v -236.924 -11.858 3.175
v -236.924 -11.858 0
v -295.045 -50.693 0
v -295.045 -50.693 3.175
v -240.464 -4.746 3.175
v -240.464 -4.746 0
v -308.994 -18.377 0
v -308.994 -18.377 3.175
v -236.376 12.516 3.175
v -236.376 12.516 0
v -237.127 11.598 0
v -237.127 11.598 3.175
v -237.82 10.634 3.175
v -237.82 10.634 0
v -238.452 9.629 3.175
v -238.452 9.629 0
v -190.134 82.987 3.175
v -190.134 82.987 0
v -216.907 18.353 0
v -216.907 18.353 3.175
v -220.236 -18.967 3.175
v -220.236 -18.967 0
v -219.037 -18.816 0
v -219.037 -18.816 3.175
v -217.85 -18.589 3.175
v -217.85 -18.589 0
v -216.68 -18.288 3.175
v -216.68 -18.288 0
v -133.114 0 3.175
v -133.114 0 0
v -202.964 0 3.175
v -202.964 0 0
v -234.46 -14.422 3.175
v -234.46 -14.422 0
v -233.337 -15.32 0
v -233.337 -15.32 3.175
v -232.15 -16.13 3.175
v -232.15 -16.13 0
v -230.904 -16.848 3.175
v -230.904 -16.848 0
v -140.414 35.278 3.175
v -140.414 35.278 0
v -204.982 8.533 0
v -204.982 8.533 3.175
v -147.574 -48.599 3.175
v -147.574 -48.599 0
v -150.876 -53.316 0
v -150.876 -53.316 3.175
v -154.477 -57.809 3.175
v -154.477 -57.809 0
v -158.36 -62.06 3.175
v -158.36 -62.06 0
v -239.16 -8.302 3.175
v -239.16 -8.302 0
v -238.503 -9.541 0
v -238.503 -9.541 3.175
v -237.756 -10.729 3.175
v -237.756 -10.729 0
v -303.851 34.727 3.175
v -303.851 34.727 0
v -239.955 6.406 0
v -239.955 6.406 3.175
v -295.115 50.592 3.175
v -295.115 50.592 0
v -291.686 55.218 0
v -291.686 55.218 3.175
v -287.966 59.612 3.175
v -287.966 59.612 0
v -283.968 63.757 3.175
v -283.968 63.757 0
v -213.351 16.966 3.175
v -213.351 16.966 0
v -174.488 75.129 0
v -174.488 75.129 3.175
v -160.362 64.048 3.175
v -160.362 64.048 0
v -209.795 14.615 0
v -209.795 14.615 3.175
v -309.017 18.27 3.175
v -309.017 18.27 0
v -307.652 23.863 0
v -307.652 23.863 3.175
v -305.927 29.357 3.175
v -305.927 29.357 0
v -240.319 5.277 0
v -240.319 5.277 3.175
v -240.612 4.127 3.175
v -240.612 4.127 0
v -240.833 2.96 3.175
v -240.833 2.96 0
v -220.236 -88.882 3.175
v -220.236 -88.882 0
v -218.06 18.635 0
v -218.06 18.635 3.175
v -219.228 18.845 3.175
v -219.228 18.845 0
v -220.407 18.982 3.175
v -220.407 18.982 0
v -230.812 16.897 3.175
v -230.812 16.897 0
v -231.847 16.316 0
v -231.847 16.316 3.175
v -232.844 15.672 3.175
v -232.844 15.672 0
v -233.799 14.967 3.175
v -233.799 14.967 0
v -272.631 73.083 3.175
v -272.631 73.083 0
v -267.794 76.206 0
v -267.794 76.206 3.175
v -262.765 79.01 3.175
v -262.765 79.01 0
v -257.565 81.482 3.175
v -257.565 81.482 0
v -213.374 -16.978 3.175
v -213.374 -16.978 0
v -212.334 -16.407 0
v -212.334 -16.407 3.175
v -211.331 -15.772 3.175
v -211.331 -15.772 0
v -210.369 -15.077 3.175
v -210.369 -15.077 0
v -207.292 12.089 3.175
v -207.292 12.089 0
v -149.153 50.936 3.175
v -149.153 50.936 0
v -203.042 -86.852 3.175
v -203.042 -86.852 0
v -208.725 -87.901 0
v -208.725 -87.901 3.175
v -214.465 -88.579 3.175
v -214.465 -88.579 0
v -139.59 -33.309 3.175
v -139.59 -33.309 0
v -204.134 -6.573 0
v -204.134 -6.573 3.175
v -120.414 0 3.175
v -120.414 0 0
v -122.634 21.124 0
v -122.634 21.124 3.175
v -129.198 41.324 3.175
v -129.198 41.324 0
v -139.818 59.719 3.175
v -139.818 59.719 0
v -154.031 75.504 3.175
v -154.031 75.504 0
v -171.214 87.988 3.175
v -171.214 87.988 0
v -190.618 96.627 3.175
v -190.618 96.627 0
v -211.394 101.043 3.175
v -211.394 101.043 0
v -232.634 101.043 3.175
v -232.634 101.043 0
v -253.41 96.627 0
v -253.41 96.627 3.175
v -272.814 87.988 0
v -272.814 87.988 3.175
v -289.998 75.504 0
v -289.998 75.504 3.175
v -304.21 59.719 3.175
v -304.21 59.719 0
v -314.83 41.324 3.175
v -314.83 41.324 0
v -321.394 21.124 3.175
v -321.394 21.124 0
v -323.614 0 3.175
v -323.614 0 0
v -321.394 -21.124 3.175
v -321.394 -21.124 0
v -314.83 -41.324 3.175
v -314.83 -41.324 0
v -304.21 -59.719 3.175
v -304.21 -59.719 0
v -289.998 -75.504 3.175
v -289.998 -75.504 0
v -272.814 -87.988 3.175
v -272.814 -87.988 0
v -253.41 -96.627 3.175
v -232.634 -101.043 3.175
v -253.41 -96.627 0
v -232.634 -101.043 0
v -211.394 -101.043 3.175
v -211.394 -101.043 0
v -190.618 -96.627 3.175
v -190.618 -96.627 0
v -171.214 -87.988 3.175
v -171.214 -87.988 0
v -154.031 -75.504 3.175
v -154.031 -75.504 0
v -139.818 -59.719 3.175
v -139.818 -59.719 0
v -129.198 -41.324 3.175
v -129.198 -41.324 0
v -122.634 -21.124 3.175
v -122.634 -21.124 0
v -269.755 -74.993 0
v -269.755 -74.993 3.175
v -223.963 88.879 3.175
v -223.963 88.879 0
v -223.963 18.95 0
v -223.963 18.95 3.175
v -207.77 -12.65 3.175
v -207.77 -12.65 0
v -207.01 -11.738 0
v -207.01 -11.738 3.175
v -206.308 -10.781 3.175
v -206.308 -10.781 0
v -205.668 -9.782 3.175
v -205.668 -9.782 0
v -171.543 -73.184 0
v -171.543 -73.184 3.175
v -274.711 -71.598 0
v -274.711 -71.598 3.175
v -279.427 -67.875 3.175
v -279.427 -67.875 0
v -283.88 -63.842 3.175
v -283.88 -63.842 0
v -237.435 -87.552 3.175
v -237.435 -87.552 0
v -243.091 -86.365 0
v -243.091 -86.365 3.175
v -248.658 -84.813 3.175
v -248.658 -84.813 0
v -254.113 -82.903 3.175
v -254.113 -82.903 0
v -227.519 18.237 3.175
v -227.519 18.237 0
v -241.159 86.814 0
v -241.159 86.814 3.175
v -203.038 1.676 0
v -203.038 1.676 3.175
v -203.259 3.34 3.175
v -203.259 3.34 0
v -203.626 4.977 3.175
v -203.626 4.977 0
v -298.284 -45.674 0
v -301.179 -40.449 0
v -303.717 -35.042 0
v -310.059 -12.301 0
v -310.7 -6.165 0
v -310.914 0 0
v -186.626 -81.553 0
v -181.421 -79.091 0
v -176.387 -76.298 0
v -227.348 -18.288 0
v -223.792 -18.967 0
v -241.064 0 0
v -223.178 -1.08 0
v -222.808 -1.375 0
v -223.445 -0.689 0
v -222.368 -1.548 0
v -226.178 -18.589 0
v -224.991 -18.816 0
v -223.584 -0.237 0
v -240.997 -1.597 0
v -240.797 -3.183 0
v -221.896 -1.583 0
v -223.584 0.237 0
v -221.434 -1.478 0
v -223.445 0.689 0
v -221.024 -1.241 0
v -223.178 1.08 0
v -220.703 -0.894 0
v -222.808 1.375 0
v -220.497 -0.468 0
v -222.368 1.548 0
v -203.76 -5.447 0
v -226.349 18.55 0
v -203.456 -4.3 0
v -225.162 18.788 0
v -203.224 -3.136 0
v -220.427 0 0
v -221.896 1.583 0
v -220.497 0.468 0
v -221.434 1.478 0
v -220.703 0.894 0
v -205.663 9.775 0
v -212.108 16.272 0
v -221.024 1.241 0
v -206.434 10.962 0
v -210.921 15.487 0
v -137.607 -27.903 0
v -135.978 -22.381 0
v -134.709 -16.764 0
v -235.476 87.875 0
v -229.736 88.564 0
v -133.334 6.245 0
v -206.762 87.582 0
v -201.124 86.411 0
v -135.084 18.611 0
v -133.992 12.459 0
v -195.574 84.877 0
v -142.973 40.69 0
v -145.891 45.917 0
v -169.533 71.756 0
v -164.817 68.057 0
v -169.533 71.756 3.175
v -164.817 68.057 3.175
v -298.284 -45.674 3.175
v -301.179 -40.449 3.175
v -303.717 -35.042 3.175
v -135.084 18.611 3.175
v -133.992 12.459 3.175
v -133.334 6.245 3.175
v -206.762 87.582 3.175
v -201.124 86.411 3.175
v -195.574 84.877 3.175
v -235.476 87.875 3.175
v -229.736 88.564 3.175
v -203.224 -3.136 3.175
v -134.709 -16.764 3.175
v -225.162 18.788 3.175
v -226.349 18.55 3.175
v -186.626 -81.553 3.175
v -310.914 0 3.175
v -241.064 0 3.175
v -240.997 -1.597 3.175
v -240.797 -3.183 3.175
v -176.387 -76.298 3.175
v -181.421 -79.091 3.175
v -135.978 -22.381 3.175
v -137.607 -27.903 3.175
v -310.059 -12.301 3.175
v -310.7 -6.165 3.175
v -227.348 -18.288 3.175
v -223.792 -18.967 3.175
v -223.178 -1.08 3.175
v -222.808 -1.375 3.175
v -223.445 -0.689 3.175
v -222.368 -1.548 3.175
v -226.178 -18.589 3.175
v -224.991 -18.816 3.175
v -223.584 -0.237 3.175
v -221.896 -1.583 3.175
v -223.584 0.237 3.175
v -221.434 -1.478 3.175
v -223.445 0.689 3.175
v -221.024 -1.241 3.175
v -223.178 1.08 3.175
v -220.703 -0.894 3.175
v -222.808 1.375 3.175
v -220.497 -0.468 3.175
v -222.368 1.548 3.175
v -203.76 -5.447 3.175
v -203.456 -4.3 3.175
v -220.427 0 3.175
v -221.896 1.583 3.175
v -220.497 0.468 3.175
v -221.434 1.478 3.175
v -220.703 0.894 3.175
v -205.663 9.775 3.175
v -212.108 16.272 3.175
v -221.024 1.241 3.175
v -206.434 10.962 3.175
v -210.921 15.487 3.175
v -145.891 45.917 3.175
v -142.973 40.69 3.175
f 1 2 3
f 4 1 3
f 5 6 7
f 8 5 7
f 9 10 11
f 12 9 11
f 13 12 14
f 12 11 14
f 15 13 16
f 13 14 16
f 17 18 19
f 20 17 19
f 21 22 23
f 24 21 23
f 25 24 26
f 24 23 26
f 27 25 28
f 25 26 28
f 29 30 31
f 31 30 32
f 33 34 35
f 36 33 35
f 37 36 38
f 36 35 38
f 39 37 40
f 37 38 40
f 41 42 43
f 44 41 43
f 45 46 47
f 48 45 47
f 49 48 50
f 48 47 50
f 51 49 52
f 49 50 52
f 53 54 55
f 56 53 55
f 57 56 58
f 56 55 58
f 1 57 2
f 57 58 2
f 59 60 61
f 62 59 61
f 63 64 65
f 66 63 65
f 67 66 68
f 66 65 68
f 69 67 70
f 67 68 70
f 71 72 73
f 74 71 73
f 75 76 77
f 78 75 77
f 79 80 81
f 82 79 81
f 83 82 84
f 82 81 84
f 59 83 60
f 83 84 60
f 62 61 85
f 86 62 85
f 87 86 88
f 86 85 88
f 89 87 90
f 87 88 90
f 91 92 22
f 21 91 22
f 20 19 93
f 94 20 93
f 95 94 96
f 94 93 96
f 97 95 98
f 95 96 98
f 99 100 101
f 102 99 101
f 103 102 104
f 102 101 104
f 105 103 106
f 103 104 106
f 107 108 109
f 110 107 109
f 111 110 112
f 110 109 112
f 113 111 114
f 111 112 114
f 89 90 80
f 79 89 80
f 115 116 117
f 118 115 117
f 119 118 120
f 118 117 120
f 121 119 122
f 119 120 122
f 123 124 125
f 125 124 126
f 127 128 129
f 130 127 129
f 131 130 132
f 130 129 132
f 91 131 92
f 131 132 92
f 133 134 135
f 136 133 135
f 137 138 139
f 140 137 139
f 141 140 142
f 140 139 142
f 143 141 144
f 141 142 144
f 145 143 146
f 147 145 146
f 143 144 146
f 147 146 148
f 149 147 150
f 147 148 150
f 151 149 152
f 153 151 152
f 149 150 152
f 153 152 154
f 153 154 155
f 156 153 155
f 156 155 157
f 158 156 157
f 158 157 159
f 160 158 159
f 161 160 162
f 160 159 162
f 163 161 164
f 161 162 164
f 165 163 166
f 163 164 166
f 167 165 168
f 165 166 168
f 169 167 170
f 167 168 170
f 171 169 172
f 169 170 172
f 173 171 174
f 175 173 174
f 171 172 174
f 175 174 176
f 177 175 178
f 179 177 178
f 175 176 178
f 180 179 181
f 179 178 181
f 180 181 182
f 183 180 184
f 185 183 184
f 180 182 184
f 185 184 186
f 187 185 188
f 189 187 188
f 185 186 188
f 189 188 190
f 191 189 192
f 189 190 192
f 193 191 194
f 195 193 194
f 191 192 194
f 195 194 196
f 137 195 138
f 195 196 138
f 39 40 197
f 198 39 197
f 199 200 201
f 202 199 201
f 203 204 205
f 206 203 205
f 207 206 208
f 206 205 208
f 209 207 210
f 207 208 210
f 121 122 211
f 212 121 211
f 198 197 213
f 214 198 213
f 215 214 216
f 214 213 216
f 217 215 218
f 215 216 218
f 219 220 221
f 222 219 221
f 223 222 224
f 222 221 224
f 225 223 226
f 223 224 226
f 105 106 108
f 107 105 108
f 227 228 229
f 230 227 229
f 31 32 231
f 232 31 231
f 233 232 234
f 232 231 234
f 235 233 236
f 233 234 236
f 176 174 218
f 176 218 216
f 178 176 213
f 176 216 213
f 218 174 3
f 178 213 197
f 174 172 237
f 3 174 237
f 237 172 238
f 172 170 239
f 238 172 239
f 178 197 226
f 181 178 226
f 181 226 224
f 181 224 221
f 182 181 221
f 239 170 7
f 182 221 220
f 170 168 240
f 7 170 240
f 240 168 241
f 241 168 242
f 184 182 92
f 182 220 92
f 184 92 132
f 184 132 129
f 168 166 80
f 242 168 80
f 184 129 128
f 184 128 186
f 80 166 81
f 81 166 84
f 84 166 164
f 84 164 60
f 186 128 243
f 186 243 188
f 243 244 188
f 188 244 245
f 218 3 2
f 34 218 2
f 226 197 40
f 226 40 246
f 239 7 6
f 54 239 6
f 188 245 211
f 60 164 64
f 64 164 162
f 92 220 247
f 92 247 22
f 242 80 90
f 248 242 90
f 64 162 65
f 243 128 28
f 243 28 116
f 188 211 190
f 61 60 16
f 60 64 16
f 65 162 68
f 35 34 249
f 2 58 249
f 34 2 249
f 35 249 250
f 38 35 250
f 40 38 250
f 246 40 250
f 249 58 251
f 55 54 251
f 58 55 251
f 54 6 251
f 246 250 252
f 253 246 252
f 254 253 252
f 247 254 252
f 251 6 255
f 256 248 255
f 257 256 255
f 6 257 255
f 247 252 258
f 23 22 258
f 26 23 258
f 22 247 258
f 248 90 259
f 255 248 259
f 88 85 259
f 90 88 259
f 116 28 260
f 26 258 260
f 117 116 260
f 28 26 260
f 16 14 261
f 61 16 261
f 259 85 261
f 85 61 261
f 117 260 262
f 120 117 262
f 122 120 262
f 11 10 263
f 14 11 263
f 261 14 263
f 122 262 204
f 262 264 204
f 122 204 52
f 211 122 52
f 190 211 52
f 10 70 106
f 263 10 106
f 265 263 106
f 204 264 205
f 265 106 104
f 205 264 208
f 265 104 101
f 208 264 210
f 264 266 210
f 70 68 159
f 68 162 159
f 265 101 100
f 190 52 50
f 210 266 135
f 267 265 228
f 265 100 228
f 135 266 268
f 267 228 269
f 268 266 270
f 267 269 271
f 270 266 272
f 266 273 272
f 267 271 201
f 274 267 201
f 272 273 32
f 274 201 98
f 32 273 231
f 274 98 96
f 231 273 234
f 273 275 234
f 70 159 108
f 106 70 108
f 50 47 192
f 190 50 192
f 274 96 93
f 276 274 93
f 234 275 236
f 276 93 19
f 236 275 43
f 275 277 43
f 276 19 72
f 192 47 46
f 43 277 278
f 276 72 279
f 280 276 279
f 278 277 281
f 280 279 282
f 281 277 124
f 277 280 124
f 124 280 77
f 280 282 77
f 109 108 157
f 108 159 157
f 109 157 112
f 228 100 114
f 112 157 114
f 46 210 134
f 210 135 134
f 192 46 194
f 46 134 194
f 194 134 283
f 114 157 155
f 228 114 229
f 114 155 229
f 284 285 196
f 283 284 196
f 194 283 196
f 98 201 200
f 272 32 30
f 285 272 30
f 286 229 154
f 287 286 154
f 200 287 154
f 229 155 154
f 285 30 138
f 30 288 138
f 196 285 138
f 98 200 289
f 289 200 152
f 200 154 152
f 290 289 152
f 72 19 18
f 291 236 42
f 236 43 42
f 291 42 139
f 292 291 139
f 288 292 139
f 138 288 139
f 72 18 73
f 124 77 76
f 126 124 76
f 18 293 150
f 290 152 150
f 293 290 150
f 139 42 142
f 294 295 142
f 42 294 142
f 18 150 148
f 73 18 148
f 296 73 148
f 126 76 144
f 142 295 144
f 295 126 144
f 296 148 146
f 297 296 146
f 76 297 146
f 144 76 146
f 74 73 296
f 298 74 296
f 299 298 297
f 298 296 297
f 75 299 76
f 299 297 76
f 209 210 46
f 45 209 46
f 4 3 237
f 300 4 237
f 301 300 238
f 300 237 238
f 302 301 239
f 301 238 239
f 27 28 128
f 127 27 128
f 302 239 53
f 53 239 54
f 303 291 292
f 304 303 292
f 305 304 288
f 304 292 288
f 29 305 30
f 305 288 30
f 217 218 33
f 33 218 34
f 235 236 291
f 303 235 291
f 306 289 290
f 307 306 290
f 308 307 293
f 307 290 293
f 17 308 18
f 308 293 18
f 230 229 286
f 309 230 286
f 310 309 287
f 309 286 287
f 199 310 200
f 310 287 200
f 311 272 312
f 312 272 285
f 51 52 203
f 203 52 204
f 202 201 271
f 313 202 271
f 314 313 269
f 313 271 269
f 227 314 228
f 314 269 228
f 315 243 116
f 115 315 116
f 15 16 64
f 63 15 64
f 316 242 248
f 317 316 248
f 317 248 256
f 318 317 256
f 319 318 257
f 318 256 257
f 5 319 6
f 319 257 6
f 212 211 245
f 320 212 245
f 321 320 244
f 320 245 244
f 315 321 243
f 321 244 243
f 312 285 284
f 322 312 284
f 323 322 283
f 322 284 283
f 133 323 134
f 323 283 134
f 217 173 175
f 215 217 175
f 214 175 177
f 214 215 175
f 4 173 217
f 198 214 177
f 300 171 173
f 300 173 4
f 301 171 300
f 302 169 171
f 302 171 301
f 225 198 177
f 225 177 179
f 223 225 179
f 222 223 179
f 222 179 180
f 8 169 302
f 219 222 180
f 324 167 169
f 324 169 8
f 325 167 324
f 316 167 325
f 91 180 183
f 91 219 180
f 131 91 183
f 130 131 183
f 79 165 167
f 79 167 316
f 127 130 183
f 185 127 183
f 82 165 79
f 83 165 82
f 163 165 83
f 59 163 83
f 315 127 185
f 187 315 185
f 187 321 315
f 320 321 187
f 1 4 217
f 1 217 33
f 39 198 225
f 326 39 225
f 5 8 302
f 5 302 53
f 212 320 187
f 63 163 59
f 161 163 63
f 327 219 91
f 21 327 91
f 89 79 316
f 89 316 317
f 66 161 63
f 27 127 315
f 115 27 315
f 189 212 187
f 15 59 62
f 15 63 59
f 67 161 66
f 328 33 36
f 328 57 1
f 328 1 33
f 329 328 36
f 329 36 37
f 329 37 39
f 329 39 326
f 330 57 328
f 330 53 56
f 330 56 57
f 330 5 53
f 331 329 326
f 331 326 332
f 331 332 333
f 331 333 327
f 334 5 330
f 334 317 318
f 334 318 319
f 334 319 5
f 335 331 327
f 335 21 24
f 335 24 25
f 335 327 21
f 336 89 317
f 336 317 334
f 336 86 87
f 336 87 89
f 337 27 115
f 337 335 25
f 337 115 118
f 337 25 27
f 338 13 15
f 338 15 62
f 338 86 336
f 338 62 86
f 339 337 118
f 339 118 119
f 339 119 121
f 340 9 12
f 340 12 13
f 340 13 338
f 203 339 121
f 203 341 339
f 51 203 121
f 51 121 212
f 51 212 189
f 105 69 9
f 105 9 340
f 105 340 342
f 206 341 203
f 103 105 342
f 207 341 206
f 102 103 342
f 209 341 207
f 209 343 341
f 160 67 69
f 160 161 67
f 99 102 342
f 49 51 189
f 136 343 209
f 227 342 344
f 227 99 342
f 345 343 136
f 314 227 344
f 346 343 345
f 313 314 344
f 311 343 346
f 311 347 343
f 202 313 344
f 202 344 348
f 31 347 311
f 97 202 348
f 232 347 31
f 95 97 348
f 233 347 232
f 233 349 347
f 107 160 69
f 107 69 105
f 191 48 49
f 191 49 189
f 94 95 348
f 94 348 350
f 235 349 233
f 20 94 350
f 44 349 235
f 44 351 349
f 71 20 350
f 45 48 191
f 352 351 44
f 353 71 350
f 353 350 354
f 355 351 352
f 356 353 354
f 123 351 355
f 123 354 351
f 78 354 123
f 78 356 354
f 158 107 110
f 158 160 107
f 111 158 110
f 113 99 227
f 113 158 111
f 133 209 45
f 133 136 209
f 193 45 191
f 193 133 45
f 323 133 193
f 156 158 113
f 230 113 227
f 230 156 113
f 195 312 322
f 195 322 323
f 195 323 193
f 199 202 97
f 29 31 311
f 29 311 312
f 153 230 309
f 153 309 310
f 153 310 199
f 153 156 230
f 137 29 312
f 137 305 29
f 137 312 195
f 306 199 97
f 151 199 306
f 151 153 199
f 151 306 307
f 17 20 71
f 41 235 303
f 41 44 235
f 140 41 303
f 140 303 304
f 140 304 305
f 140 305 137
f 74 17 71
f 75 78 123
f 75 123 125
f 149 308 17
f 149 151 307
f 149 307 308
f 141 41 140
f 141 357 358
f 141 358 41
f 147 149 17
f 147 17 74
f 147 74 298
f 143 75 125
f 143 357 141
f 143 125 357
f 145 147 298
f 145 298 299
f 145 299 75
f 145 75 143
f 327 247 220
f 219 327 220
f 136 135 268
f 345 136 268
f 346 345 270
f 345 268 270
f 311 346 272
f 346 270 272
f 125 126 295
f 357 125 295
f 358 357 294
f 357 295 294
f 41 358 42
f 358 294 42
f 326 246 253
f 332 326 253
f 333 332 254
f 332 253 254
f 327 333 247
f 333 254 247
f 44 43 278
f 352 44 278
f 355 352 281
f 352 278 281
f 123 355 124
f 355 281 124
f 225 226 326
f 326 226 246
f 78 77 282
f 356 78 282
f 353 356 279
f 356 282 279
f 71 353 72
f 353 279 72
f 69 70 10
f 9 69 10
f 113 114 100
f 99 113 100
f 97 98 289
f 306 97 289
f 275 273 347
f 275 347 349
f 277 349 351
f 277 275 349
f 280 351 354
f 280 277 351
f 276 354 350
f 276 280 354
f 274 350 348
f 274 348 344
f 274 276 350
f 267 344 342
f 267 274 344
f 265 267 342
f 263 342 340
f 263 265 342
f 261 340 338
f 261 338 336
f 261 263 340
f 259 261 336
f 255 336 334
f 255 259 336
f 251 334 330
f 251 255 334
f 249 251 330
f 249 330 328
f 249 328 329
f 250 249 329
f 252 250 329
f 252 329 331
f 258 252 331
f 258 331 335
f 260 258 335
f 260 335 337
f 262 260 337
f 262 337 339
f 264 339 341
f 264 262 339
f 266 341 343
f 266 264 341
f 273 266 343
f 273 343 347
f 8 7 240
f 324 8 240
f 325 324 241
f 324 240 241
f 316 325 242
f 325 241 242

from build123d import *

# Parameters (mm, degrees)
F0_R     = 101.6
F0_R_2   = 1.5875
F1_DEPTH = 3.175


with BuildPart() as f1:
    # F0 (on Top) → F1 (new body)
    with BuildSketch(Plane.XY):
        with Locations((-222.0142495763, 0)):
            Circle(F0_R)
        with BuildLine():
            ThreePointArc((-135.0841670946, 18.6110386526), (-133.6081006594, 9.3575014662), (-133.1142495763, 0))
            ThreePointArc((-133.1142495763, 0), (-133.5138959069, -8.4200594054), (-134.7092417111, -16.7644147423))
            ThreePointArc((-134.7092417111, -16.7644147423), (-136.7474474497, -25.1551675627), (-139.5900616279, -33.3086061109))
            ThreePointArc((-139.5900616279, -33.3086061109), (-143.2102820197, -41.1478395221), (-147.5739459516, -48.598880607))
            ThreePointArc((-147.5739459516, -48.598880607), (-152.6399112932, -55.5914668612), (-158.360366293, -62.0595934804))
            ThreePointArc((-158.360366293, -62.0595934804), (-164.6813795848, -67.9422697482), (-171.5432871751, -73.183959679))
            ThreePointArc((-171.5432871751, -73.183959679), (-178.8814001833, -77.7352384909), (-186.626445729, -81.5531319991))
            ThreePointArc((-186.626445729, -81.5531319991), (-194.7054136888, -84.6016399514), (-203.0420278604, -86.8519706349))
            ThreePointArc((-203.0420278604, -86.8519706349), (-211.5895960266, -88.2866728242), (-220.2362495763, -88.8822182216))
            ThreePointArc((-220.2362495763, -88.8822182216), (-228.8678354502, -88.6354238477), (-237.4347591324, -87.552372241))
            ThreePointArc((-237.4347591324, -87.552372241), (-245.8871604157, -85.6346549479), (-254.1126475187, -82.9029725012))
            ThreePointArc((-254.1126475187, -82.9029725012), (-262.1294417887, -79.3346163649), (-269.7553877472, -74.9932912076))
            ThreePointArc((-269.7553877472, -74.9932912076), (-277.1006777085, -69.7760376894), (-283.8801808983, -63.8421220016))
            ThreePointArc((-283.8801808983, -63.8421220016), (-289.7820886129, -57.5389432672), (-295.0446428617, -50.6929152504))
            ThreePointArc((-295.0446428617, -50.6929152504), (-299.7753730949, -43.0861656349), (-303.7165832559, -35.0419558715))
            ThreePointArc((-303.7165832559, -35.0419558715), (-306.7658950479, -26.8396831175), (-308.9940333585, -18.3773559905))
            ThreePointArc((-308.9940333585, -18.3773559905), (-310.4328923453, -9.2387017963), (-310.9142495763, 0))
            ThreePointArc((-310.9142495763, 0), (-310.4386004074, 9.1839087597), (-309.0167427123, 18.2695426359))
            ThreePointArc((-309.0167427123, 18.2695426359), (-306.8338994736, 26.6239927753), (-303.8508380517, 34.7272628738))
            ThreePointArc((-303.8508380517, 34.7272628738), (-299.8878577, 42.8825274186), (-295.1147930895, 50.5917042416))
            ThreePointArc((-295.1147930895, 50.5917042416), (-289.8616154265, 57.4451472902), (-283.9683084188, 63.7566043084))
            ThreePointArc((-283.9683084188, 63.7566043084), (-278.492561142, 68.6542811679), (-272.6311232915, 73.0831177174))
            ThreePointArc((-272.6311232915, 73.0831177174), (-265.3020509448, 77.6490582859), (-257.5645783025, 81.482416063))
            ThreePointArc((-257.5645783025, 81.482416063), (-249.4916380011, 84.5470468163), (-241.1594570914, 86.814002495))
            ThreePointArc((-241.1594570914, 86.814002495), (-232.611492416, 88.2661228569), (-223.9627253989, 88.8786444652))
            ThreePointArc((-223.9627253989, 88.8786444652), (-215.3306033923, 88.6484002884), (-206.7615413815, 87.5817611876))
            ThreePointArc((-206.7615413815, 87.5817611876), (-198.3363015236, 85.6887669185), (-190.1344670232, 82.987284956))
            ThreePointArc((-190.1344670232, 82.987284956), (-182.1171041904, 79.4444950267), (-174.4875934361, 75.1294014094))
            ThreePointArc((-174.4875934361, 75.1294014094), (-167.1441754618, 69.9463005931), (-160.3616651357, 64.0481758663))
            ThreePointArc((-160.3616651357, 64.0481758663), (-154.4386858425, 57.7646361199), (-149.1532629181, 50.9361033373))
            ThreePointArc((-149.1532629181, 50.9361033373), (-144.3877117041, 43.32817349), (-140.4137383593, 35.2784150596))
            ThreePointArc((-140.4137383593, 35.2784150596), (-137.3378620047, 27.0761774964), (-135.0841670946, 18.6110386526))
        make_face(mode=Mode.SUBTRACT)
        with BuildLine():
            ThreePointArc((-203.224138098, -3.1359545012), (-203.0293328836, -1.5733525255), (-202.9642495763, 0))
            ThreePointArc((-202.9642495763, 0), (-203.130398482, 2.5105114713), (-203.6259469881, 4.9772309496))
            ThreePointArc((-203.6259469881, 4.9772309496), (-204.2151087323, 6.7891888481), (-204.9823245659, 8.5332309496))
            ThreePointArc((-204.9823245659, 8.5332309496), (-206.0377764326, 10.3756833938), (-207.2917159952, 12.0892309496))
            ThreePointArc((-207.2917159952, 12.0892309496), (-208.4843092912, 13.410563593), (-209.7950211992, 14.6148198028))
            ThreePointArc((-209.7950211992, 14.6148198028), (-211.5070394956, 15.8902811907), (-213.3510211992, 16.9661714622))
            ThreePointArc((-213.3510211992, 16.9661714622), (-215.0942112255, 17.7486779571), (-216.9070211992, 18.3526215649))
            ThreePointArc((-216.9070211992, 18.3526215649), (-218.6422260186, 18.7491855057), (-220.4068691602, 18.9820659623))
            ThreePointArc((-220.4068691602, 18.9820659623), (-222.1855449982, 19.04922985), (-223.9627253989, 18.9500908169))
            ThreePointArc((-223.9627253989, 18.9500908169), (-225.7577238112, 18.6785679497), (-227.5187253989, 18.237413356))
            ThreePointArc((-227.5187253989, 18.237413356), (-229.1968564876, 17.6440544648), (-230.8122822323, 16.8966600659))
            ThreePointArc((-230.8122822323, 16.8966600659), (-232.3508996999, 16.0017550357), (-233.7992765057, 14.9671520429))
            ThreePointArc((-233.7992765057, 14.9671520429), (-235.1447680812, 13.8018833422), (-236.3756280629, 12.5161219219))
            ThreePointArc((-236.3756280629, 12.5161219219), (-237.48111084, 11.1210926914), (-238.4515653653, 9.6289744861))
            ThreePointArc((-238.4515653653, 9.6289744861), (-239.2785194107, 8.0527937441), (-239.9547535309, 6.4063107836))
            ThreePointArc((-239.9547535309, 6.4063107836), (-240.4743640903, 4.7038996726), (-240.8328148031, 2.960422741))
            ThreePointArc((-240.8328148031, 2.960422741), (-241.0063027509, 1.4847276568), (-241.0642495763, 0))
            ThreePointArc((-241.0642495763, 0), (-240.9134990954, -2.3918335259), (-240.4636335537, -4.7458119279))
            ThreePointArc((-240.4636335537, -4.7458119279), (-239.9004906688, -6.5562855018), (-239.1601650874, -8.3018119279))
            ThreePointArc((-239.1601650874, -8.3018119279), (-238.1403018874, -10.1416436962), (-236.9238034356, -11.8578119279))
            ThreePointArc((-236.9238034356, -11.8578119279), (-235.7519928893, -13.1976099604), (-234.4602495763, -14.4221906796))
            ThreePointArc((-234.4602495763, -14.4221906796), (-232.751004782, -15.7360918799), (-230.9042495763, -16.848453935))
            ThreePointArc((-230.9042495763, -16.848453935), (-229.1625792566, -17.6579693844), (-227.3482495763, -18.288))
            ThreePointArc((-227.3482495763, -18.288), (-225.5864119038, -18.7120858353), (-223.7922495763, -18.9668451778))
            ThreePointArc((-223.7922495763, -18.9668451778), (-222.0142495763, -19.05), (-220.2362495763, -18.9668451778))
            ThreePointArc((-220.2362495763, -18.9668451778), (-218.4420872488, -18.7120858353), (-216.6802495763, -18.288))
            ThreePointArc((-216.6802495763, -18.288), (-214.9966529265, -17.7103313707), (-213.3743210538, -16.9780486254))
            ThreePointArc((-213.3743210538, -16.9780486254), (-211.8274171831, -16.0975447132), (-210.3694460406, -15.0765065786))
            ThreePointArc((-210.3694460406, -15.0765065786), (-209.0131359551, -13.9238480532), (-207.7703277374, -12.649632036))
            ThreePointArc((-207.7703277374, -12.649632036), (-206.6518713084, -11.2649826433), (-205.6675309773, -9.7819880927))
            ThreePointArc((-205.6675309773, -9.7819880927), (-204.8259001977, -8.2135951714), (-204.1343265453, -6.5734962087))
            ThreePointArc((-204.1343265453, -6.5734962087), (-203.5988475721, -4.876009539), (-203.224138098, -3.1359545012))
        make_face()
        with Locations((-222.0142495763, 0)):
            Circle(F0_R_2, mode=Mode.SUBTRACT)
        with BuildLine():
            Line((-238.4515653653, 9.6289744861), (-295.1147930895, 50.5917042416))
            ThreePointArc((-295.1147930895, 50.5917042416), (-299.8878577, 42.8825274186), (-303.8508380517, 34.7272628738))
            Line((-303.8508380517, 34.7272628738), (-239.9547535309, 6.4063107836))
            ThreePointArc((-239.9547535309, 6.4063107836), (-239.2785194107, 8.0527937441), (-238.4515653653, 9.6289744861))
        make_face()
        with BuildLine():
            ThreePointArc((-269.7553877472, -74.9932912076), (-262.1294417887, -79.3346163649), (-254.1126475187, -82.9029725012))
            Line((-254.1126475187, -82.9029725012), (-227.3482495763, -18.288))
            ThreePointArc((-227.3482495763, -18.288), (-229.1625792566, -17.6579693844), (-230.9042495763, -16.848453935))
            Line((-230.9042495763, -16.848453935), (-269.7553877472, -74.9932912076))
        make_face()
        with BuildLine():
            Line((-240.8328148031, 2.960422741), (-309.0167427123, 18.2695426359))
            ThreePointArc((-309.0167427123, 18.2695426359), (-310.4386004074, 9.1839087597), (-310.9142495763, 0))
            Line((-310.9142495763, 0), (-241.0642495763, 0))
            ThreePointArc((-241.0642495763, 0), (-241.0063027509, 1.4847276568), (-240.8328148031, 2.960422741))
        make_face()
        with BuildLine():
            Line((-213.3510211992, 16.9661714622), (-174.4875934361, 75.1294014094))
            ThreePointArc((-174.4875934361, 75.1294014094), (-182.1171041904, 79.4444950267), (-190.1344670232, 82.987284956))
            Line((-190.1344670232, 82.987284956), (-216.9070211992, 18.3526215649))
            ThreePointArc((-216.9070211992, 18.3526215649), (-215.0942112255, 17.7486779571), (-213.3510211992, 16.9661714622))
        make_face()
        with BuildLine():
            Line((-203.6259469881, 4.9772309496), (-135.0841670946, 18.6110386526))
            ThreePointArc((-135.0841670946, 18.6110386526), (-137.3378620047, 27.0761774964), (-140.4137383593, 35.2784150596))
            Line((-140.4137383593, 35.2784150596), (-204.9823245659, 8.5332309496))
            ThreePointArc((-204.9823245659, 8.5332309496), (-204.2151087323, 6.7891888481), (-203.6259469881, 4.9772309496))
        make_face()
        with BuildLine():
            ThreePointArc((-308.9940333585, -18.3773559905), (-306.7658950479, -26.8396831175), (-303.7165832559, -35.0419558715))
            Line((-303.7165832559, -35.0419558715), (-239.1601650874, -8.3018119279))
            ThreePointArc((-239.1601650874, -8.3018119279), (-239.9004906688, -6.5562855018), (-240.4636335537, -4.7458119279))
            Line((-240.4636335537, -4.7458119279), (-308.9940333585, -18.3773559905))
        make_face()
        with BuildLine():
            Line((-220.4068691602, 18.9820659623), (-206.7615413815, 87.5817611876))
            ThreePointArc((-206.7615413815, 87.5817611876), (-215.3306033923, 88.6484002884), (-223.9627253989, 88.8786444652))
            Line((-223.9627253989, 88.8786444652), (-223.9627253989, 18.9500908169))
            ThreePointArc((-223.9627253989, 18.9500908169), (-222.1855449982, 19.04922985), (-220.4068691602, 18.9820659623))
        make_face()
        with BuildLine():
            ThreePointArc((-237.4347591324, -87.552372241), (-228.8678354502, -88.6354238477), (-220.2362495763, -88.8822182216))
            Line((-220.2362495763, -88.8822182216), (-220.2362495763, -18.9668451778))
            ThreePointArc((-220.2362495763, -18.9668451778), (-222.0142495763, -19.05), (-223.7922495763, -18.9668451778))
            Line((-223.7922495763, -18.9668451778), (-237.4347591324, -87.552372241))
        make_face()
        with BuildLine():
            Line((-207.2917159952, 12.0892309496), (-149.1532629181, 50.9361033373))
            ThreePointArc((-149.1532629181, 50.9361033373), (-154.4386858425, 57.7646361199), (-160.3616651357, 64.0481758663))
            Line((-160.3616651357, 64.0481758663), (-209.7950211992, 14.6148198028))
            ThreePointArc((-209.7950211992, 14.6148198028), (-208.4843092912, 13.410563593), (-207.2917159952, 12.0892309496))
        make_face()
        with BuildLine():
            Line((-227.5187253989, 18.237413356), (-241.1594570914, 86.814002495))
            ThreePointArc((-241.1594570914, 86.814002495), (-249.4916380011, 84.5470468163), (-257.5645783025, 81.482416063))
            Line((-257.5645783025, 81.482416063), (-230.8122822323, 16.8966600659))
            ThreePointArc((-230.8122822323, 16.8966600659), (-229.1968564876, 17.6440544648), (-227.5187253989, 18.237413356))
        make_face()
        with BuildLine():
            ThreePointArc((-203.0420278604, -86.8519706349), (-194.7054136888, -84.6016399514), (-186.626445729, -81.5531319991))
            Line((-186.626445729, -81.5531319991), (-213.3743210538, -16.9780486254))
            ThreePointArc((-213.3743210538, -16.9780486254), (-214.9966529265, -17.7103313707), (-216.6802495763, -18.288))
            Line((-216.6802495763, -18.288), (-203.0420278604, -86.8519706349))
        make_face()
        with BuildLine():
            ThreePointArc((-295.0446428617, -50.6929152504), (-289.7820886129, -57.5389432672), (-283.8801808983, -63.8421220016))
            Line((-283.8801808983, -63.8421220016), (-234.4602495763, -14.4221906796))
            ThreePointArc((-234.4602495763, -14.4221906796), (-235.7519928893, -13.1976099604), (-236.9238034356, -11.8578119279))
            Line((-236.9238034356, -11.8578119279), (-295.0446428617, -50.6929152504))
        make_face()
        with BuildLine():
            ThreePointArc((-171.5432871751, -73.183959679), (-164.6813795848, -67.9422697482), (-158.360366293, -62.0595934804))
            Line((-158.360366293, -62.0595934804), (-207.7703277374, -12.649632036))
            ThreePointArc((-207.7703277374, -12.649632036), (-209.0131359551, -13.9238480532), (-210.3694460406, -15.0765065786))
            Line((-210.3694460406, -15.0765065786), (-171.5432871751, -73.183959679))
        make_face()
        with BuildLine():
            ThreePointArc((-147.5739459516, -48.598880607), (-143.2102820197, -41.1478395221), (-139.5900616279, -33.3086061109))
            Line((-139.5900616279, -33.3086061109), (-204.1343265453, -6.5734962087))
            ThreePointArc((-204.1343265453, -6.5734962087), (-204.8259001977, -8.2135951714), (-205.6675309773, -9.7819880927))
            Line((-205.6675309773, -9.7819880927), (-147.5739459516, -48.598880607))
        make_face()
        with BuildLine():
            ThreePointArc((-134.7092417111, -16.7644147423), (-133.5138959069, -8.4200594054), (-133.1142495763, 0))
            Line((-133.1142495763, 0), (-202.9642495763, 0))
            ThreePointArc((-202.9642495763, 0), (-203.0293328836, -1.5733525255), (-203.224138098, -3.1359545012))
            Line((-203.224138098, -3.1359545012), (-134.7092417111, -16.7644147423))
        make_face()
        with BuildLine():
            Line((-233.7992765057, 14.9671520429), (-272.6311232915, 73.0831177174))
            ThreePointArc((-272.6311232915, 73.0831177174), (-278.492561142, 68.6542811679), (-283.9683084188, 63.7566043084))
            Line((-283.9683084188, 63.7566043084), (-236.3756280629, 12.5161219219))
            ThreePointArc((-236.3756280629, 12.5161219219), (-235.1447680812, 13.8018833422), (-233.7992765057, 14.9671520429))
        make_face()
    extrude(amount=F1_DEPTH)


solid = f1.part
